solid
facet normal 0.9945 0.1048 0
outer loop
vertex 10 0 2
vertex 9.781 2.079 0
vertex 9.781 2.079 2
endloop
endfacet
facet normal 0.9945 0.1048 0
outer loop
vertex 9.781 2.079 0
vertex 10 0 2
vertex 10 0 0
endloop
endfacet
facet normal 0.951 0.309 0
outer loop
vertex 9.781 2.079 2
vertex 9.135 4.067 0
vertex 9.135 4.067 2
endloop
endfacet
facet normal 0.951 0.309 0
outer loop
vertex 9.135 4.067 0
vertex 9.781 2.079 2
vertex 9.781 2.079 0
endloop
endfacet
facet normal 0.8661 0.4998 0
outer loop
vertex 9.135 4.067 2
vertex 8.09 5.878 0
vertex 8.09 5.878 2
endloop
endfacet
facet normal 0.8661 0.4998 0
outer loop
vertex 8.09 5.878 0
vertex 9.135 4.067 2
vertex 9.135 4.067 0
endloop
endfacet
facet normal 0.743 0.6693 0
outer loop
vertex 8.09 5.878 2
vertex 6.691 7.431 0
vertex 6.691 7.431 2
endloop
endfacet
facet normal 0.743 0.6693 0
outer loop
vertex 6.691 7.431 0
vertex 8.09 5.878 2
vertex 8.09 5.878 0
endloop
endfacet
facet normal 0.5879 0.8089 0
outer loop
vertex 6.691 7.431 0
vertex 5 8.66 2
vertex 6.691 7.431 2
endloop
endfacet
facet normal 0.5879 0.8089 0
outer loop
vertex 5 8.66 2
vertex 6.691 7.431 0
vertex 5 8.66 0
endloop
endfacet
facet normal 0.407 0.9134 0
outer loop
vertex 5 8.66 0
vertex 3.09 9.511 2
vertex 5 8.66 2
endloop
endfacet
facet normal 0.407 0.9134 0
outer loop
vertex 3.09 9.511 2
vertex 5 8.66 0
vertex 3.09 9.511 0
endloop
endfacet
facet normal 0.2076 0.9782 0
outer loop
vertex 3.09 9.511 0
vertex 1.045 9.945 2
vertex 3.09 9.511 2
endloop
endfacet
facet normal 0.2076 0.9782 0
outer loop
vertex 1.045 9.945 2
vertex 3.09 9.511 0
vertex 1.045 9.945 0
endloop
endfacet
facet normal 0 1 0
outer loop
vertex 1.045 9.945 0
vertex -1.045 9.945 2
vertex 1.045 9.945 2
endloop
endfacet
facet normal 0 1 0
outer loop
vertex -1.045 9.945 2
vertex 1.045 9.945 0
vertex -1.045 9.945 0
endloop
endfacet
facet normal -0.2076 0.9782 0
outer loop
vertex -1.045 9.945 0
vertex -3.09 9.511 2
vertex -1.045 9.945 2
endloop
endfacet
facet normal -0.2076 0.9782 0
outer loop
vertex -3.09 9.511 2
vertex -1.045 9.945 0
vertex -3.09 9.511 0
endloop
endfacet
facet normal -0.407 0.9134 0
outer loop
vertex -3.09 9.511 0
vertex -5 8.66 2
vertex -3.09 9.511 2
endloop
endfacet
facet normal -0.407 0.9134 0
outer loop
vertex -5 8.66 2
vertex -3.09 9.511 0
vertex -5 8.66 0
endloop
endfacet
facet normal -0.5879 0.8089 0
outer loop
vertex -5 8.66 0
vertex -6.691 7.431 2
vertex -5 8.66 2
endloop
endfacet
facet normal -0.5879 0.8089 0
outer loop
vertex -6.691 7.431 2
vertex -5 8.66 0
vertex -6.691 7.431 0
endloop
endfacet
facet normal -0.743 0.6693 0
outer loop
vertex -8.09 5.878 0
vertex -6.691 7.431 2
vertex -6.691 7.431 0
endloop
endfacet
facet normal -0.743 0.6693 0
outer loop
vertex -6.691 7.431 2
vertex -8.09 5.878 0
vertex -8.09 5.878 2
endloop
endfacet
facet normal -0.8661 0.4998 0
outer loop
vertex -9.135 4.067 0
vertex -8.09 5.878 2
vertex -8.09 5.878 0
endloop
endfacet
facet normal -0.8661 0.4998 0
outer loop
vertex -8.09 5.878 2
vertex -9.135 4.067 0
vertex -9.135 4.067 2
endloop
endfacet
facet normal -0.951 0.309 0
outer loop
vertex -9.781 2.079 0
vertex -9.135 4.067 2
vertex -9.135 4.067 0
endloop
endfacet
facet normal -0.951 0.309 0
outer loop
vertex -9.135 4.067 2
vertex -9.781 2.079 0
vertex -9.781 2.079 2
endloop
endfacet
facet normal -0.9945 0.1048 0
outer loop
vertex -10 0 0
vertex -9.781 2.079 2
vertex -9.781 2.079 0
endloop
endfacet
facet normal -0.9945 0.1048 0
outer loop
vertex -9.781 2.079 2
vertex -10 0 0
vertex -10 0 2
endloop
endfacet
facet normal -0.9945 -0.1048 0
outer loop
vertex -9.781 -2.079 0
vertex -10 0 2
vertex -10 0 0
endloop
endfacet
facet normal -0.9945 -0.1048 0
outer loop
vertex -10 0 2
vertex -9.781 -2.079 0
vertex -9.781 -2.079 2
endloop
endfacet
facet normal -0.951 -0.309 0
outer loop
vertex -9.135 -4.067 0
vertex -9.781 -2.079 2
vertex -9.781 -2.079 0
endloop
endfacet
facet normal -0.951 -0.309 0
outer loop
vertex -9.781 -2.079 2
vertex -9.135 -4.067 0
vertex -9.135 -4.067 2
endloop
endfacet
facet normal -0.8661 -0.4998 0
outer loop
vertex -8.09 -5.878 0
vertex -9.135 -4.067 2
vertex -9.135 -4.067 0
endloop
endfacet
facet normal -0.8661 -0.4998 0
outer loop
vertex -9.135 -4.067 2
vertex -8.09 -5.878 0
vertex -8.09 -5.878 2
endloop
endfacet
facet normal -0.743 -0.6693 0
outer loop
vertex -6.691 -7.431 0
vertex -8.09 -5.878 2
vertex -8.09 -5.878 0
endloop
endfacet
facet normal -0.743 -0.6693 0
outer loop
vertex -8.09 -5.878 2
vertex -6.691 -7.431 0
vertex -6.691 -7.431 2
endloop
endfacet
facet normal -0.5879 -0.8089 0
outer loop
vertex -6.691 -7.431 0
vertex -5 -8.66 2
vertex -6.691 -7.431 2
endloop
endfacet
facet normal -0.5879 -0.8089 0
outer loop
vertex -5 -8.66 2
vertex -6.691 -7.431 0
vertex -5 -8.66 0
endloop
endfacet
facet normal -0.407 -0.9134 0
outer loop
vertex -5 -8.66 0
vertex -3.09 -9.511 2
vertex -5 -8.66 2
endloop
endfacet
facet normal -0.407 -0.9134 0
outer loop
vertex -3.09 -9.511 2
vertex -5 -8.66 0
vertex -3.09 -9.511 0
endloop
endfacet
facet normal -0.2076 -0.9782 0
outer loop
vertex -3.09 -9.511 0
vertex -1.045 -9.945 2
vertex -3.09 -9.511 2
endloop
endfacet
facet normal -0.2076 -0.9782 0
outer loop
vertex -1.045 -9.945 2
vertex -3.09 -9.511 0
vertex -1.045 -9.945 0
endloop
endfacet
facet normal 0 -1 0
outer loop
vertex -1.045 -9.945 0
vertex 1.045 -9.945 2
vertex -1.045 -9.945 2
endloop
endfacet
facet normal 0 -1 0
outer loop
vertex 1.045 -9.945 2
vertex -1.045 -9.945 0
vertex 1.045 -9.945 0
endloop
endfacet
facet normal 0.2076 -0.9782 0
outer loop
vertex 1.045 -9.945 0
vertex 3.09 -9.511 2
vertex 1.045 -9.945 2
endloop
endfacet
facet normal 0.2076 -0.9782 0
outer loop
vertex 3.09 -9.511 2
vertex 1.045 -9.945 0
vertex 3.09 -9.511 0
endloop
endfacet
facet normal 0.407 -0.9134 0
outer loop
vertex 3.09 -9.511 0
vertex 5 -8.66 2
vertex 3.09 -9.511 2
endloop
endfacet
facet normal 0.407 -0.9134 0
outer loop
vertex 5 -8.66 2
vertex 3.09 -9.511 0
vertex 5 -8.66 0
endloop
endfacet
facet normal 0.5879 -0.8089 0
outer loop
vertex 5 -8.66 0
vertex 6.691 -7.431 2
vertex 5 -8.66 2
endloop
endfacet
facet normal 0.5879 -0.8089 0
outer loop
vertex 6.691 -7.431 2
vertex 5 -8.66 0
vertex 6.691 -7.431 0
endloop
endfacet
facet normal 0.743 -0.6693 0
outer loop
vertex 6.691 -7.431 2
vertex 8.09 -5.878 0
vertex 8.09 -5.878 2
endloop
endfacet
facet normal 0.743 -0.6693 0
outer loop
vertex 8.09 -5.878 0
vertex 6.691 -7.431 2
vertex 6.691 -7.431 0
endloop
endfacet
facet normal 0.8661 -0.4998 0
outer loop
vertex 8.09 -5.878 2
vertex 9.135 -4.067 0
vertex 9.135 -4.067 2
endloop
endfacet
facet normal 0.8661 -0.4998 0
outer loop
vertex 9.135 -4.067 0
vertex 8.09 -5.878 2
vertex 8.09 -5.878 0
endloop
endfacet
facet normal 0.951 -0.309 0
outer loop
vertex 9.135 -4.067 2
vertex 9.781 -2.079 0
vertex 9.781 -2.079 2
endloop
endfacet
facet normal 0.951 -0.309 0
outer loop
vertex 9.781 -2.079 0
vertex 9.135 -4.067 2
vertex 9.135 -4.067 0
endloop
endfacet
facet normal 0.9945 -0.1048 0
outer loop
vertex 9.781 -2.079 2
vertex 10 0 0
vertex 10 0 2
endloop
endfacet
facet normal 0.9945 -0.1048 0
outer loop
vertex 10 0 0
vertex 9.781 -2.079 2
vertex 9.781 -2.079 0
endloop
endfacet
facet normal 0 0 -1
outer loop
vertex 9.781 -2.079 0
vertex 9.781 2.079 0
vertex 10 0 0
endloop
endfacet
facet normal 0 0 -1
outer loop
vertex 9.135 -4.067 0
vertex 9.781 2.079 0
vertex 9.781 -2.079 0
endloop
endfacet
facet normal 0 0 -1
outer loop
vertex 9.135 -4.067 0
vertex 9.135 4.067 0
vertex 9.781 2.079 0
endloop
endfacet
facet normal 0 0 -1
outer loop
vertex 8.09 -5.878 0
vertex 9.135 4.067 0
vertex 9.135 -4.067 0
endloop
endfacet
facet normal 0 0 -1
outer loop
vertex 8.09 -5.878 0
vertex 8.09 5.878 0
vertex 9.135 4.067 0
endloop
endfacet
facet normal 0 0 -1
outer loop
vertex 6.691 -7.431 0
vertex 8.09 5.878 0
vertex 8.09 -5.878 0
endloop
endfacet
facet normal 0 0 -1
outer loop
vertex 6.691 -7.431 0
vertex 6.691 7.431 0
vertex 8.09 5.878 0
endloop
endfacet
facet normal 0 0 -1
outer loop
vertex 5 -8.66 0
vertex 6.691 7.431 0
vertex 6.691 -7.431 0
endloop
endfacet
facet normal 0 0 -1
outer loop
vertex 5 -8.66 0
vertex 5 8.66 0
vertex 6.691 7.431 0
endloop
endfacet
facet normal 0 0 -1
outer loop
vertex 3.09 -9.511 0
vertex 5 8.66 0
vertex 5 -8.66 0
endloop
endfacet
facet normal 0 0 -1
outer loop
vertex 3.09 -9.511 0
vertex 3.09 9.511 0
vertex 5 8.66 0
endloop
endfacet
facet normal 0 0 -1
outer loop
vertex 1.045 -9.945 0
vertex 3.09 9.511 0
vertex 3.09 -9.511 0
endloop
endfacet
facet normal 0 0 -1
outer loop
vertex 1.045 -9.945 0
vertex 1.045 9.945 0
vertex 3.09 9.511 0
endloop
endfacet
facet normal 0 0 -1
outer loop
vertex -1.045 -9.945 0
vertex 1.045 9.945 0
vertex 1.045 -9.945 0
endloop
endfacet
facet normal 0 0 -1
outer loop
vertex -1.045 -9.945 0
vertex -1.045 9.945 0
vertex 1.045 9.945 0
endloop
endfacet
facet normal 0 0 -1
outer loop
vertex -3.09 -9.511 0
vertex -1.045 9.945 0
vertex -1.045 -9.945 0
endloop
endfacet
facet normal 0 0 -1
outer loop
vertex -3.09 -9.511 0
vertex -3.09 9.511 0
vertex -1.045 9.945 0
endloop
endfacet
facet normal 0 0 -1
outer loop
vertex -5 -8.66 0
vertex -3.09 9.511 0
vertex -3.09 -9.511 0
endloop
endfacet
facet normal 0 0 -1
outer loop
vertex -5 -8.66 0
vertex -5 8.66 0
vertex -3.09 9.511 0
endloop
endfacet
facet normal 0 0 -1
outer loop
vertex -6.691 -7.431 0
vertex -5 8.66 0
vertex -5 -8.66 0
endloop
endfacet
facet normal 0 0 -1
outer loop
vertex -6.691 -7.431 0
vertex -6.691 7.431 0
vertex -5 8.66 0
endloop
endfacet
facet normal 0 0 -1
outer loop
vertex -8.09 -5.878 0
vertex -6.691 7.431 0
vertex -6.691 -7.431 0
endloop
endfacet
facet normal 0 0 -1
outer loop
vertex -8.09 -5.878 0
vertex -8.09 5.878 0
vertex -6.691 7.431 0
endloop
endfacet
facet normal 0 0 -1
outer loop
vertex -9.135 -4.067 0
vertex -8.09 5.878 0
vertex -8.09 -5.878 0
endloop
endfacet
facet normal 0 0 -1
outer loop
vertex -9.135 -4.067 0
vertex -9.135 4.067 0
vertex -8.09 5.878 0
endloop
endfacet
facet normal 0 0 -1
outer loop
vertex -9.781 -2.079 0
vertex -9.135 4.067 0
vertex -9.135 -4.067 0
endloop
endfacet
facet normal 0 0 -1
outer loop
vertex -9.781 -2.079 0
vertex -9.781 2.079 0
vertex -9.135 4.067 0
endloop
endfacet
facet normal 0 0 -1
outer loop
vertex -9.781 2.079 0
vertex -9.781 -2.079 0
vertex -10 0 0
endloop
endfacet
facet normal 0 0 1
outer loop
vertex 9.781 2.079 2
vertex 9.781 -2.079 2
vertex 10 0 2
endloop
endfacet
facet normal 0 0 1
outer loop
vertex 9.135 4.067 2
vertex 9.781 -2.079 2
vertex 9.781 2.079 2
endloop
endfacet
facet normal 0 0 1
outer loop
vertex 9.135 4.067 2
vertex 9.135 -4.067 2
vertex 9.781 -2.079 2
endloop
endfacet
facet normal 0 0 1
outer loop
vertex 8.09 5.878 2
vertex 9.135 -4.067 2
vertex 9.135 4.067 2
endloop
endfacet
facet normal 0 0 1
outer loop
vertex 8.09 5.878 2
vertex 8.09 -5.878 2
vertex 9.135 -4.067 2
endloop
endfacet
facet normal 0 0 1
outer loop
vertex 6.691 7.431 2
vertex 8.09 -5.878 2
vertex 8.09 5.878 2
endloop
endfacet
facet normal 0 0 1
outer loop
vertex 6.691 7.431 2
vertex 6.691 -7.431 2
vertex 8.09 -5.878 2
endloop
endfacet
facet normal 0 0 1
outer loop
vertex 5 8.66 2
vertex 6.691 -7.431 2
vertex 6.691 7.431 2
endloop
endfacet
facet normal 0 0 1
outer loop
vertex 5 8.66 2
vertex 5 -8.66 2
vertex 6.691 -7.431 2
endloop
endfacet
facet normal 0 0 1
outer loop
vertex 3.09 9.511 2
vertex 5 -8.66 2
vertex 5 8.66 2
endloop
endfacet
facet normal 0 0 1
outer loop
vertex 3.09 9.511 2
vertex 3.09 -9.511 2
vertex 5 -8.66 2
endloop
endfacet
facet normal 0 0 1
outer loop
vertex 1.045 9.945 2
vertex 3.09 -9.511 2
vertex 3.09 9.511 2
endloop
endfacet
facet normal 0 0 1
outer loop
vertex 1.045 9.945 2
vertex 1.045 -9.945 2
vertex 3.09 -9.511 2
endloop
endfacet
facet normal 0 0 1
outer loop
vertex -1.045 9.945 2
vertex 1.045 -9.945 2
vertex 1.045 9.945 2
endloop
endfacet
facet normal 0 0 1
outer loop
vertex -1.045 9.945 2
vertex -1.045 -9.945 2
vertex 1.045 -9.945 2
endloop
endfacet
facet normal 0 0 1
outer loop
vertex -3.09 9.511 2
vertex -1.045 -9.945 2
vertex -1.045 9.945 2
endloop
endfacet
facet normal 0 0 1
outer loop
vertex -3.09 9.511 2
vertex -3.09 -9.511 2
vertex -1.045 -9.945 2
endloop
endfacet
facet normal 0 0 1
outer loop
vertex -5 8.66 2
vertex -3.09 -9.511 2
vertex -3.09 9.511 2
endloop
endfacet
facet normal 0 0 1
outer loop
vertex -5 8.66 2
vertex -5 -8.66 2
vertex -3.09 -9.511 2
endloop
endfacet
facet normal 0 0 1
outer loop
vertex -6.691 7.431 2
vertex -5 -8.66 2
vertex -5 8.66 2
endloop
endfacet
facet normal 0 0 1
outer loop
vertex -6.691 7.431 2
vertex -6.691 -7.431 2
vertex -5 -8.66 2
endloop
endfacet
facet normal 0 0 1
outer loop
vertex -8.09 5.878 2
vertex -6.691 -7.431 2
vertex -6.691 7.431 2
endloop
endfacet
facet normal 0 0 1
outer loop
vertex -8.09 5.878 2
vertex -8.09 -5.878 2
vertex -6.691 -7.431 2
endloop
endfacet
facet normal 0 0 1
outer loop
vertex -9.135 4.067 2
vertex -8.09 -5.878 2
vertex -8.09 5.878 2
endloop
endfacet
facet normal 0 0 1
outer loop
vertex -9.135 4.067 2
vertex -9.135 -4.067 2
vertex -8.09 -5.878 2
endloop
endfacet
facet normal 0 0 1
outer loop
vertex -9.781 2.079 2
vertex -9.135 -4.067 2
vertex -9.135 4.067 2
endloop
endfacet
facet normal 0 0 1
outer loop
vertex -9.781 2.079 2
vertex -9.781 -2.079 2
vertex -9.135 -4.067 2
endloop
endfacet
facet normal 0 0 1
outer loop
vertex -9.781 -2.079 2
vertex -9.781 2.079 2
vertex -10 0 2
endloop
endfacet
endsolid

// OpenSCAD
// A disc
// An example in a second folder.
cylinder(d = 20, h = 2);
